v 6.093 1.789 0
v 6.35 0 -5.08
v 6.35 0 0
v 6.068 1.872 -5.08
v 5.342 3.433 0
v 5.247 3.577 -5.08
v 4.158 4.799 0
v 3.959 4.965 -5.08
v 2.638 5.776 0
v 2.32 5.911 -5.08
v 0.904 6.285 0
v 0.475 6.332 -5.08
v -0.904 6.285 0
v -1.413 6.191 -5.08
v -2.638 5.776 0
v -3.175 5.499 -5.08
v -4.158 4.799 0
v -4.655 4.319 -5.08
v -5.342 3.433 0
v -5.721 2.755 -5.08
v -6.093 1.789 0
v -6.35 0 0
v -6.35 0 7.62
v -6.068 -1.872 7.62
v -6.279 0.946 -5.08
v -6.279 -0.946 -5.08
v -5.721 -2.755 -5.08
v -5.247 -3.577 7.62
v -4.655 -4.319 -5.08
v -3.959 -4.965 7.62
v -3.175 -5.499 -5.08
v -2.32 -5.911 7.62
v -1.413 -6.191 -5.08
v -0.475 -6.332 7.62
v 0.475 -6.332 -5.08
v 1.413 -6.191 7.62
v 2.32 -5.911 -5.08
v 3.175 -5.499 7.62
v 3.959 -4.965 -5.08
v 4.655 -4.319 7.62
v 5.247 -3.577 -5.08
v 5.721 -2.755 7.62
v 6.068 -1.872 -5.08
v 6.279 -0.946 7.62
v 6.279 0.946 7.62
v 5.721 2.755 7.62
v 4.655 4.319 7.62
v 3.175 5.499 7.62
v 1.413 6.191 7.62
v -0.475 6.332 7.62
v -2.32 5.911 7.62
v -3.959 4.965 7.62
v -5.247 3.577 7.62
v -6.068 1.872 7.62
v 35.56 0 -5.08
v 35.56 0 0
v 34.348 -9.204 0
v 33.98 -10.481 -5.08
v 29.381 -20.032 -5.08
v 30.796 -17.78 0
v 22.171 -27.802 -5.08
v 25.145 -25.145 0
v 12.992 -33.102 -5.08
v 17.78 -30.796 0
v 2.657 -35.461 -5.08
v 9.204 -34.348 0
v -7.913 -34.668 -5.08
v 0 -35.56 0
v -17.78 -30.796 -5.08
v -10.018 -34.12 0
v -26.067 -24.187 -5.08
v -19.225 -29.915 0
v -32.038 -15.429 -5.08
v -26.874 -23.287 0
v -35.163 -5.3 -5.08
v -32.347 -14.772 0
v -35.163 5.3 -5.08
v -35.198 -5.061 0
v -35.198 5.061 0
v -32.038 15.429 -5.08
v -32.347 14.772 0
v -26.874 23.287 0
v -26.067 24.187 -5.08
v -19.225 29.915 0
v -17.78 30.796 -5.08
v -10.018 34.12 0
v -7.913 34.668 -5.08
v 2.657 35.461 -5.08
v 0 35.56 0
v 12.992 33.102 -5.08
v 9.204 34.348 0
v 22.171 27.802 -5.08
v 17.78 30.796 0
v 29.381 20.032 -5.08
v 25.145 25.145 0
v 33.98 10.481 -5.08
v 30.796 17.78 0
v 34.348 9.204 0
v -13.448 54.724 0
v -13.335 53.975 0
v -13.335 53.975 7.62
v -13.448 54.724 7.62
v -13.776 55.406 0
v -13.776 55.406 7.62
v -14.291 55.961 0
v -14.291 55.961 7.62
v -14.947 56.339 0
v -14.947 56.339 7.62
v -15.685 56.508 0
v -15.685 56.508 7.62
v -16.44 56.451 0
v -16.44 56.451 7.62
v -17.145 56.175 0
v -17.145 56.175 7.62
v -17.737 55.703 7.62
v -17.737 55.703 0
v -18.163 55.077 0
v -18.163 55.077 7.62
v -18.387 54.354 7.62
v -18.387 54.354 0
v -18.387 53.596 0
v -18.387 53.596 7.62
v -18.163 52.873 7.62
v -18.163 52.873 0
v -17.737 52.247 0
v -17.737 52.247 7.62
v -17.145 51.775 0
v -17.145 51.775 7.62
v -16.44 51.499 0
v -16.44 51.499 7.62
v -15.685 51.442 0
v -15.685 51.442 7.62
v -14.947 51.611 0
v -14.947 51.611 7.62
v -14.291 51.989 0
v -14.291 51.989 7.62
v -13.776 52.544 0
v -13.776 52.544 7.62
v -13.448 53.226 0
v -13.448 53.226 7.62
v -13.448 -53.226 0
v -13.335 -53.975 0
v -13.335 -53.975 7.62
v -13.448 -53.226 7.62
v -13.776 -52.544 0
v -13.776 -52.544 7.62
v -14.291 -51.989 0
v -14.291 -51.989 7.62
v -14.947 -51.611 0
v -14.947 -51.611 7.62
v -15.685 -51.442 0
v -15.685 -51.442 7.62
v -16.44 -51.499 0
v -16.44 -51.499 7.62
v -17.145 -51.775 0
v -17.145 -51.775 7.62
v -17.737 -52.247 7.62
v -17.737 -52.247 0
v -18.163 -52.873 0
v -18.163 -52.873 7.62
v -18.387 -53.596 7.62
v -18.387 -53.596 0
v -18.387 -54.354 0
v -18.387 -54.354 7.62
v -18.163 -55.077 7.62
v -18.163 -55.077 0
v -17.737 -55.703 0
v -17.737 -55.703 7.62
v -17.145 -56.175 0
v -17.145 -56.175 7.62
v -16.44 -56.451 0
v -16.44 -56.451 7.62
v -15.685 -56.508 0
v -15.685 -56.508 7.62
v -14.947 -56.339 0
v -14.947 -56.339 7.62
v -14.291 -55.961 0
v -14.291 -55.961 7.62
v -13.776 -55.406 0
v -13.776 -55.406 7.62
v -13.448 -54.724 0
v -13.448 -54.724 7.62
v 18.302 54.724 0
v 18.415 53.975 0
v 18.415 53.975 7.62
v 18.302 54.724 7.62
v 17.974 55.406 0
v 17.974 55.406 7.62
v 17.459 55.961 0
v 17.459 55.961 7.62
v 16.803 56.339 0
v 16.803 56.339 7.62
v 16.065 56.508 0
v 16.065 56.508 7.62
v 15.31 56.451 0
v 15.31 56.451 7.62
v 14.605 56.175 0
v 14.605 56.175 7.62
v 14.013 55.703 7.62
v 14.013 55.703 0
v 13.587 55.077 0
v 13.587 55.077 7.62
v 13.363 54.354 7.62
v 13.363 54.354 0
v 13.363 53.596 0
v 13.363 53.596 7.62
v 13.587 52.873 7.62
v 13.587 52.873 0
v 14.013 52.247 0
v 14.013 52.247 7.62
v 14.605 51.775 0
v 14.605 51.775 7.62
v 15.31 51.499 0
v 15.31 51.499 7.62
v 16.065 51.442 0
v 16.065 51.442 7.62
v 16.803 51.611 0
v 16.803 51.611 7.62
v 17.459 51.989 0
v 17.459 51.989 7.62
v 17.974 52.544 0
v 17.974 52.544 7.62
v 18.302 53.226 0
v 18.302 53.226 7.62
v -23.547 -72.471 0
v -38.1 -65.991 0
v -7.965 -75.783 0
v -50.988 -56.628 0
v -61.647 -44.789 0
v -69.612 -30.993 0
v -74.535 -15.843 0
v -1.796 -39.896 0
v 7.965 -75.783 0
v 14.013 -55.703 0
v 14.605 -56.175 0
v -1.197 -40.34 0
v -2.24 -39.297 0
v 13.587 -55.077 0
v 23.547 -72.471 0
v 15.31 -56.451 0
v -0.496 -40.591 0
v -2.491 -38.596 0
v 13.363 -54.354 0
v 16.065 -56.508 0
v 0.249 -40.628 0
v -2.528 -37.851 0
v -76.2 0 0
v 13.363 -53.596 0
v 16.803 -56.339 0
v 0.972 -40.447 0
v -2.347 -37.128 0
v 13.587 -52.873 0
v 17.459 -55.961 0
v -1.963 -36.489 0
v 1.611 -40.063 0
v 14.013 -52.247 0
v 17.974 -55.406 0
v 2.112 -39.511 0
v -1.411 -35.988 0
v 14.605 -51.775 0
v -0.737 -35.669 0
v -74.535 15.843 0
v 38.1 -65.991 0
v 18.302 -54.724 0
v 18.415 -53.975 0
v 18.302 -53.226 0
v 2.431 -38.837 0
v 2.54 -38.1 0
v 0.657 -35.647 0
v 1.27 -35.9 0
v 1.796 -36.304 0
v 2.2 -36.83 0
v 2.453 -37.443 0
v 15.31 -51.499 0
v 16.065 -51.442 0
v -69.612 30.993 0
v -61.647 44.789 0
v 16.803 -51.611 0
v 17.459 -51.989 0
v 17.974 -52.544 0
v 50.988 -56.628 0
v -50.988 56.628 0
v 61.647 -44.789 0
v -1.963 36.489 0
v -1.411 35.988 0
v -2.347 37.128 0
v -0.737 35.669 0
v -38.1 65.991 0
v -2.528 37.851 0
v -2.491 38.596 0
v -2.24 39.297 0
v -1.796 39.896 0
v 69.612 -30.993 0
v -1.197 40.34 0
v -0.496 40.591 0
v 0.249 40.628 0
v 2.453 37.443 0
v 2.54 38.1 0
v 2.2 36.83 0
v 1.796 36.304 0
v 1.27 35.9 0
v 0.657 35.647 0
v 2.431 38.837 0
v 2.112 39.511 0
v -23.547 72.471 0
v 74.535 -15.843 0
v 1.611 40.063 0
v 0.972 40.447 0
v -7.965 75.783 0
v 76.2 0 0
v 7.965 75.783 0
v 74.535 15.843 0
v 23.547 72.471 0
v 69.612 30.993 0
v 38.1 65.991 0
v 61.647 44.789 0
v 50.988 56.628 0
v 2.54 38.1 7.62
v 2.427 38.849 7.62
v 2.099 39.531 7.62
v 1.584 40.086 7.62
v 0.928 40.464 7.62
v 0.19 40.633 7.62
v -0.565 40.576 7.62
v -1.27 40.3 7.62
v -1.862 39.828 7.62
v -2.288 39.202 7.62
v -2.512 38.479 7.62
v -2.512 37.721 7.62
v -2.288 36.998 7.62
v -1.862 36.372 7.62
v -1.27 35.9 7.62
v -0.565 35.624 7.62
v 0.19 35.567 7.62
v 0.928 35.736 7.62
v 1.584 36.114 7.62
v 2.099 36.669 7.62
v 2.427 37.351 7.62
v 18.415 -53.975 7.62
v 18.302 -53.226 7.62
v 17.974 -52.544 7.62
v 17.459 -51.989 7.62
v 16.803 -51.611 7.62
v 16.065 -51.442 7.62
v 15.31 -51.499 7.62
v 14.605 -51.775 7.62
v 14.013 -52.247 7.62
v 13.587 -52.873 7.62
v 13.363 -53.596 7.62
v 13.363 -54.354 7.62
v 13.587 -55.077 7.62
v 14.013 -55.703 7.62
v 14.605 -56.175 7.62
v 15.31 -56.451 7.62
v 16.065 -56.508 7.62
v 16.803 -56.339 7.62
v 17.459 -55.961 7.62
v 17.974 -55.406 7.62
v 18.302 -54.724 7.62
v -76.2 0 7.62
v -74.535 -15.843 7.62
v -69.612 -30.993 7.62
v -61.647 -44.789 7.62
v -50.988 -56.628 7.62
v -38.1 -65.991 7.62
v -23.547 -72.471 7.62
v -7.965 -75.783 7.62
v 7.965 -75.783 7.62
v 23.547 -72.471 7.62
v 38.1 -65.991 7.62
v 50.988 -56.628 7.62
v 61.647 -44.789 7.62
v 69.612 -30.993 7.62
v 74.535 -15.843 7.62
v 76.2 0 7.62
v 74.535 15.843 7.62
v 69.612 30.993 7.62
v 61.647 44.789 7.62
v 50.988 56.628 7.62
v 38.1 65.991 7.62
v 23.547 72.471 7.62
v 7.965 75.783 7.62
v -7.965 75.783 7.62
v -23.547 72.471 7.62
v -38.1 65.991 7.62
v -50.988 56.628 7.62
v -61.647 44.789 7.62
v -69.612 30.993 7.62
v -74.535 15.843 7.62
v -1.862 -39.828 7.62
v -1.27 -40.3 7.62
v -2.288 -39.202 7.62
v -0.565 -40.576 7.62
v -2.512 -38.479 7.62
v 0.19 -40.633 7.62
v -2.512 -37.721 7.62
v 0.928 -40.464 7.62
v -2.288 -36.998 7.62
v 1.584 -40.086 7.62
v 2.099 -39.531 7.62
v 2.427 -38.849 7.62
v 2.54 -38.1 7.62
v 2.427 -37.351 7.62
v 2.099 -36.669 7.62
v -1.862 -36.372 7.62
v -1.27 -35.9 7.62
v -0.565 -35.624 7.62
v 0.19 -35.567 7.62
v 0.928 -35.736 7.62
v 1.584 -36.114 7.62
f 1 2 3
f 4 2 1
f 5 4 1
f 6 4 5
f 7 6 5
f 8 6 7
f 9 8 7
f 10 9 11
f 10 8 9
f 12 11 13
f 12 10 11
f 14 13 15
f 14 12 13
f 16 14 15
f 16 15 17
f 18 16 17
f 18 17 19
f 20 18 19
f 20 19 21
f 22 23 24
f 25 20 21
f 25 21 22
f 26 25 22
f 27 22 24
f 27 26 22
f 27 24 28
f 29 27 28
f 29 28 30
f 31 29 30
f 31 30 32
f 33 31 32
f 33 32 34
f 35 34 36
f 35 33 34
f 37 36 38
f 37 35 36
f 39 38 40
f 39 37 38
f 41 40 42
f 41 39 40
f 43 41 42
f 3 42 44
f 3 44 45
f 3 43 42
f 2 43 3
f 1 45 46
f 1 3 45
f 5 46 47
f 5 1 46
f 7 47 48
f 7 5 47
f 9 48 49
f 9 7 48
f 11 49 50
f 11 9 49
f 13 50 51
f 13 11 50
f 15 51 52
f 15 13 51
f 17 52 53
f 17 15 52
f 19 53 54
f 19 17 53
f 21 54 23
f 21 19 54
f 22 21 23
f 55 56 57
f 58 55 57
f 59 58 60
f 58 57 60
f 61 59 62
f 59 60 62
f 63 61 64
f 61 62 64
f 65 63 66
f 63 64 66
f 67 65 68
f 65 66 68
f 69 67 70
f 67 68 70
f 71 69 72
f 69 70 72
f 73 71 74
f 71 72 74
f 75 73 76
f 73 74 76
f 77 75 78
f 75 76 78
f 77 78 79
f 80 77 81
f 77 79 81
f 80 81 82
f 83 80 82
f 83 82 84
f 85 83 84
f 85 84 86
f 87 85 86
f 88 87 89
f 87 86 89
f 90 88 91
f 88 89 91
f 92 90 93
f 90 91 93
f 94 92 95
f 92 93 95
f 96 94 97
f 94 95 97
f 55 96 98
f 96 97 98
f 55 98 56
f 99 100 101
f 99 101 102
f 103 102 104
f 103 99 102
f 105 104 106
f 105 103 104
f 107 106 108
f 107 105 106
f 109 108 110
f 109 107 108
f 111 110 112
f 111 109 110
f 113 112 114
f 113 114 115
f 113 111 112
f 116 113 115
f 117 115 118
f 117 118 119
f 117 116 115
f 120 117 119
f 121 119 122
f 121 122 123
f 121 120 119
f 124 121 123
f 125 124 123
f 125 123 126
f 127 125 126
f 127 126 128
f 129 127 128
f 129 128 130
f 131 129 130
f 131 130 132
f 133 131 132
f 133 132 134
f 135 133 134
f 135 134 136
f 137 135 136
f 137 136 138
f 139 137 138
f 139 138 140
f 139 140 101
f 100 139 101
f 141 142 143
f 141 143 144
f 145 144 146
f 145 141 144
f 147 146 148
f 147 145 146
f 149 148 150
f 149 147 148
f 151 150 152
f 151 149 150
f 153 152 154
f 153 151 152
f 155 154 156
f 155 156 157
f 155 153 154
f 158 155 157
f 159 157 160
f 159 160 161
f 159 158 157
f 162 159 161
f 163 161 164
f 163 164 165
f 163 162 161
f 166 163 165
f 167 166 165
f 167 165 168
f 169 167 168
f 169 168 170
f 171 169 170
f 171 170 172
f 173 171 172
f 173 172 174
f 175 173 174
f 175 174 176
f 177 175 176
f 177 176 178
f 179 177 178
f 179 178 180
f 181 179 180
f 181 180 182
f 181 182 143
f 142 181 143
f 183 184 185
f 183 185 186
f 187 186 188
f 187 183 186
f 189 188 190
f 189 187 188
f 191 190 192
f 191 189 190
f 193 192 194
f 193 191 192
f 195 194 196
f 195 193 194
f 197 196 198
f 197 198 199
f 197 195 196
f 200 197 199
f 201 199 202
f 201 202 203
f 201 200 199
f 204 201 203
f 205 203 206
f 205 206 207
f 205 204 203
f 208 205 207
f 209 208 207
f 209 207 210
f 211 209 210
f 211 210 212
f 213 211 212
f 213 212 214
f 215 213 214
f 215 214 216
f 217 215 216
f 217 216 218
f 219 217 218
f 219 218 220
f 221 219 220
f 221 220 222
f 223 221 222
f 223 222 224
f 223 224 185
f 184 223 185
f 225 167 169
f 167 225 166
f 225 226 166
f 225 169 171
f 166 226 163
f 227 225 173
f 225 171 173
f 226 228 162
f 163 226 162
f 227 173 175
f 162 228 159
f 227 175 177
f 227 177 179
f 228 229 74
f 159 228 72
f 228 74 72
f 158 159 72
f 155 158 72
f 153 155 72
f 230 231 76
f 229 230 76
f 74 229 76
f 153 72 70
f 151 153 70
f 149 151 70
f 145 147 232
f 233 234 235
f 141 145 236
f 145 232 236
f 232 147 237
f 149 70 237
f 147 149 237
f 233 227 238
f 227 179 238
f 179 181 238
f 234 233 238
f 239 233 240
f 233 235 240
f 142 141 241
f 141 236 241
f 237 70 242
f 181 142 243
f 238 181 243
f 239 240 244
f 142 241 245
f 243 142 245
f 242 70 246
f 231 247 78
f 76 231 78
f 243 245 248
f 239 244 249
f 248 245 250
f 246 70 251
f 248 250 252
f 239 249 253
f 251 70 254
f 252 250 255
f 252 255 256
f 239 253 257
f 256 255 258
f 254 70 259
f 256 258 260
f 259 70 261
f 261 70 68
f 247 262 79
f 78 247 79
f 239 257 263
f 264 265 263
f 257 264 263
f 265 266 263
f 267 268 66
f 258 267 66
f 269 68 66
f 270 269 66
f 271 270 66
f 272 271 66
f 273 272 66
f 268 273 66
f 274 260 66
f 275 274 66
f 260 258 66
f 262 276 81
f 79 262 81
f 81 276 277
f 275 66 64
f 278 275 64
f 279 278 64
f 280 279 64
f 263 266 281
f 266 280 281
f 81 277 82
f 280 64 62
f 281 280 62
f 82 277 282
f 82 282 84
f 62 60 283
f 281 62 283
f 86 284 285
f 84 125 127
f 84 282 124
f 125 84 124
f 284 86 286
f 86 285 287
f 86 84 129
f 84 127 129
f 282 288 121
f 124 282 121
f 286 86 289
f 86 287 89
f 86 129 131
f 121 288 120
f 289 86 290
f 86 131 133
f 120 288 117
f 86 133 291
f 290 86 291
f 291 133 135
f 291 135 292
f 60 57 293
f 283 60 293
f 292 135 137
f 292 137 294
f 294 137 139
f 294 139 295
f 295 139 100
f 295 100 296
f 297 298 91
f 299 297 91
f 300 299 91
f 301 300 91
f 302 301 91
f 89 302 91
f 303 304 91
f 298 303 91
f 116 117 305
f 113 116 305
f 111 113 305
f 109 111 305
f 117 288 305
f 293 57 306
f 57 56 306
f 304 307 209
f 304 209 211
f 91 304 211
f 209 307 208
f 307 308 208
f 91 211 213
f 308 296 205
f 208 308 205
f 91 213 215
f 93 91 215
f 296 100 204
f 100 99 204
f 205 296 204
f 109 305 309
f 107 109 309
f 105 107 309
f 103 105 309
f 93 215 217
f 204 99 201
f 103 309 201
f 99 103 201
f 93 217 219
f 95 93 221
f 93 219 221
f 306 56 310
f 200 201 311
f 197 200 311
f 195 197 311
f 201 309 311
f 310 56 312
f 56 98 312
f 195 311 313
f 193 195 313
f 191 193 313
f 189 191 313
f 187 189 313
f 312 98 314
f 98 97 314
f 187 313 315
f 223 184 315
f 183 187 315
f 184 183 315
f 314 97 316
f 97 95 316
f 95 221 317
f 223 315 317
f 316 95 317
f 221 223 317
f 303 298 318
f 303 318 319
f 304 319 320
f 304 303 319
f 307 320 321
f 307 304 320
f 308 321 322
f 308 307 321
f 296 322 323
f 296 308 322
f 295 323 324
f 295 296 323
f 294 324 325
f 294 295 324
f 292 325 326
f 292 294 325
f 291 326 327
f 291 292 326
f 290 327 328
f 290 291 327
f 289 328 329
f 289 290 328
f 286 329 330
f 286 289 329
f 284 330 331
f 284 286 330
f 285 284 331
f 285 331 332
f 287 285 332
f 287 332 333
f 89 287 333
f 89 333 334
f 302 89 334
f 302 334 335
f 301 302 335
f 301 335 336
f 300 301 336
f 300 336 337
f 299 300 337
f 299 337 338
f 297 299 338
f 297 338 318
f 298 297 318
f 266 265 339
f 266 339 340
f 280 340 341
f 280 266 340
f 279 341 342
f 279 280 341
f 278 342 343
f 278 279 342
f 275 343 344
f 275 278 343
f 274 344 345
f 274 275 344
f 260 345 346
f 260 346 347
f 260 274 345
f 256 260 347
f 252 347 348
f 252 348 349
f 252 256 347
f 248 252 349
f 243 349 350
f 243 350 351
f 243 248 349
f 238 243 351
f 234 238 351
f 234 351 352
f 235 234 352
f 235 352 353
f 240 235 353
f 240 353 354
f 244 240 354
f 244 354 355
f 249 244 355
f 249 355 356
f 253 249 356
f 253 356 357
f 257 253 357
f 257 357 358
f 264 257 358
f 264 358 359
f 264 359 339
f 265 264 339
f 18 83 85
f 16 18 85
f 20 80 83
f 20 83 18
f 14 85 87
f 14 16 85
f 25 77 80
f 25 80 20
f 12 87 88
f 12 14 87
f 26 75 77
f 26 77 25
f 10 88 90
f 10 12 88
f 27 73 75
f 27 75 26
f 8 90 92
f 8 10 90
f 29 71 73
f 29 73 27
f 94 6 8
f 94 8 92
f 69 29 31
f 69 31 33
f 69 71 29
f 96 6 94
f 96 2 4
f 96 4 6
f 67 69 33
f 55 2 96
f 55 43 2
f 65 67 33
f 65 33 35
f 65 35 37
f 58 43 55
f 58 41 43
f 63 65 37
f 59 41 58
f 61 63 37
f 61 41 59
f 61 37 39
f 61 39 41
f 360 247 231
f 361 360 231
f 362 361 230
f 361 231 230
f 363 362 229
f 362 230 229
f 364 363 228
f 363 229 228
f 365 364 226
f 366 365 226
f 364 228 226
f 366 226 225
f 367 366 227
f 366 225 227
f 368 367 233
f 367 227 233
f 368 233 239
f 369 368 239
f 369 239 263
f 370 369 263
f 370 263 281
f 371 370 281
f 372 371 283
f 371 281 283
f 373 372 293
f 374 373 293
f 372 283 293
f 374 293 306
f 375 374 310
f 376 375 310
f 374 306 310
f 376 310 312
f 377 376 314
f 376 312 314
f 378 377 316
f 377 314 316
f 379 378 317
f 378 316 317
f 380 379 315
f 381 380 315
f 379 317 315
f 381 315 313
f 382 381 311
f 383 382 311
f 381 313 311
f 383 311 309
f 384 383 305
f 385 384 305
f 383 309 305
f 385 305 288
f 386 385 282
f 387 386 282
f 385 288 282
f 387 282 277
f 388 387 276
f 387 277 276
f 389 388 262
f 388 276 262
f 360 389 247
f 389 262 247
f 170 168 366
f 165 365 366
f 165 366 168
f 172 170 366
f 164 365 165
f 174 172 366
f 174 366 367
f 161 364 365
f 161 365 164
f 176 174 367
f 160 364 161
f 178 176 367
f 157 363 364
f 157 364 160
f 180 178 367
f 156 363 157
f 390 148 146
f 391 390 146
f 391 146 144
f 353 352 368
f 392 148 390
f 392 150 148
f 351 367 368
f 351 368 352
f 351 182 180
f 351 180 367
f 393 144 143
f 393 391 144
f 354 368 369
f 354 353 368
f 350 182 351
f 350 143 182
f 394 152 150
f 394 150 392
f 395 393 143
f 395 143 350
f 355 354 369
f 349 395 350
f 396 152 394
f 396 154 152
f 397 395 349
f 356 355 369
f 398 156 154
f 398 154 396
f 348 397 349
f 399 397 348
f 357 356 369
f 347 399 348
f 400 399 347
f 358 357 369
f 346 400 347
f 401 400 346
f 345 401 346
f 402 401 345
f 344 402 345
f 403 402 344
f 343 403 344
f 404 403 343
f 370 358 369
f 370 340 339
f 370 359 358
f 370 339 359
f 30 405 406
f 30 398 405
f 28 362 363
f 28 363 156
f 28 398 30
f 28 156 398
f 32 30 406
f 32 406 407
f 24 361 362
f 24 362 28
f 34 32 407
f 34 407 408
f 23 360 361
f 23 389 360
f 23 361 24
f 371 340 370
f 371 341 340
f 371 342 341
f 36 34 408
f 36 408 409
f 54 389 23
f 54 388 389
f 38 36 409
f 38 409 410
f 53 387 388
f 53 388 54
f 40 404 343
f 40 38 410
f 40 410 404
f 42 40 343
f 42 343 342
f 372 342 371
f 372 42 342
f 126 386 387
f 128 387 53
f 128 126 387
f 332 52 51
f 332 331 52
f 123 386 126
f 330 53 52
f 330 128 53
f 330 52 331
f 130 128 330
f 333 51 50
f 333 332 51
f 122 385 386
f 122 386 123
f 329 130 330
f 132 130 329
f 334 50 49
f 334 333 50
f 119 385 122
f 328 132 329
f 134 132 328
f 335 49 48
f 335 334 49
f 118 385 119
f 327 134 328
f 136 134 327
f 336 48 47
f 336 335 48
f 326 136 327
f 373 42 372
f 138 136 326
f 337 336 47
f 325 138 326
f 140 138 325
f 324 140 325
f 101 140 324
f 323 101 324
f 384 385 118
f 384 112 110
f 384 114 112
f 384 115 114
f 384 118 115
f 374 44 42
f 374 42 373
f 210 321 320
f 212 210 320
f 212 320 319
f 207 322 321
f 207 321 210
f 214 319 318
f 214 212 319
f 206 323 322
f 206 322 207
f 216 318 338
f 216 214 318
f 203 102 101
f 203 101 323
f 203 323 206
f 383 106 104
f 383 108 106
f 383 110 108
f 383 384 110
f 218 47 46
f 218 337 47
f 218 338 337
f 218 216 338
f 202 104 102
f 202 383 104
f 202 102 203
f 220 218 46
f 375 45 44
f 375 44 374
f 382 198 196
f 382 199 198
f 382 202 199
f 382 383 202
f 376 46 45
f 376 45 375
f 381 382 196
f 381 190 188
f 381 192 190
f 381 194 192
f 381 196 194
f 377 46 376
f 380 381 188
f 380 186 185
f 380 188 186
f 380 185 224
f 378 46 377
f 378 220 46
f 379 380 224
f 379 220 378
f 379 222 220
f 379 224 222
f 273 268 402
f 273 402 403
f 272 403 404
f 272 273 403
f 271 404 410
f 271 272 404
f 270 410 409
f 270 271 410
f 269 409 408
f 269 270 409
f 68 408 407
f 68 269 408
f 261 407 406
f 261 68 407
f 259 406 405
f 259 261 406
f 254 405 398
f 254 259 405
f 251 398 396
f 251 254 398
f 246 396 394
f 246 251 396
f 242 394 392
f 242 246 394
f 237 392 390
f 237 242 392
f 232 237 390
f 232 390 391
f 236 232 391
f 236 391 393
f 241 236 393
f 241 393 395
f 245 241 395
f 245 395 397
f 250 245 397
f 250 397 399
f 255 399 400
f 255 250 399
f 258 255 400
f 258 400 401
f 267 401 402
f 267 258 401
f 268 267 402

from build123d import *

# Parameters (mm, degrees)
SKETCH1_R           = 76.2
SKETCH1_R_2         = 6.35
BOSS_EXTRUDE1_DEPTH = 7.62
SKETCH2_R           = 35.56
BOSS_EXTRUDE2_DEPTH = 5.08
CUT_EXTRUDE2_START  = -25.4
SKETCH3_R           = 2.54
SKETCH3_R_2         = 6.35
CUT_EXTRUDE2_DEPTH  = 25.4


with BuildPart() as part:
    # Sketch1 → Boss-Extrude1 (new body)
    with BuildSketch(Plane.XY):
        Circle(SKETCH1_R)
        Circle(SKETCH1_R_2, mode=Mode.SUBTRACT)
    extrude(amount=BOSS_EXTRUDE1_DEPTH)

    # Sketch2 → Boss-Extrude2 (add)
    with BuildSketch(Plane(origin=(0, 0, 0), x_dir=(-1, 0, 0), z_dir=(0, 0, -1))):
        Circle(SKETCH2_R)
    extrude(amount=BOSS_EXTRUDE2_DEPTH)

    # Sketch3 → Cut-Extrude2 (cut)
    with BuildSketch(Plane.XY.offset(7.62).offset(CUT_EXTRUDE2_START)):
        with Locations((15.875, -53.975)):
            Circle(SKETCH3_R)
        with Locations((-15.875, -53.975)):
            Circle(SKETCH3_R)
        with Locations((0, -38.1)):
            Circle(SKETCH3_R)
        with Locations((-15.875, 53.975)):
            Circle(SKETCH3_R)
        with Locations((0, 38.1)):
            Circle(SKETCH3_R)
        with Locations((15.875, 53.975)):
            Circle(SKETCH3_R)
        Circle(SKETCH3_R_2)
    extrude(amount=CUT_EXTRUDE2_DEPTH, mode=Mode.SUBTRACT)


solid = part.part
